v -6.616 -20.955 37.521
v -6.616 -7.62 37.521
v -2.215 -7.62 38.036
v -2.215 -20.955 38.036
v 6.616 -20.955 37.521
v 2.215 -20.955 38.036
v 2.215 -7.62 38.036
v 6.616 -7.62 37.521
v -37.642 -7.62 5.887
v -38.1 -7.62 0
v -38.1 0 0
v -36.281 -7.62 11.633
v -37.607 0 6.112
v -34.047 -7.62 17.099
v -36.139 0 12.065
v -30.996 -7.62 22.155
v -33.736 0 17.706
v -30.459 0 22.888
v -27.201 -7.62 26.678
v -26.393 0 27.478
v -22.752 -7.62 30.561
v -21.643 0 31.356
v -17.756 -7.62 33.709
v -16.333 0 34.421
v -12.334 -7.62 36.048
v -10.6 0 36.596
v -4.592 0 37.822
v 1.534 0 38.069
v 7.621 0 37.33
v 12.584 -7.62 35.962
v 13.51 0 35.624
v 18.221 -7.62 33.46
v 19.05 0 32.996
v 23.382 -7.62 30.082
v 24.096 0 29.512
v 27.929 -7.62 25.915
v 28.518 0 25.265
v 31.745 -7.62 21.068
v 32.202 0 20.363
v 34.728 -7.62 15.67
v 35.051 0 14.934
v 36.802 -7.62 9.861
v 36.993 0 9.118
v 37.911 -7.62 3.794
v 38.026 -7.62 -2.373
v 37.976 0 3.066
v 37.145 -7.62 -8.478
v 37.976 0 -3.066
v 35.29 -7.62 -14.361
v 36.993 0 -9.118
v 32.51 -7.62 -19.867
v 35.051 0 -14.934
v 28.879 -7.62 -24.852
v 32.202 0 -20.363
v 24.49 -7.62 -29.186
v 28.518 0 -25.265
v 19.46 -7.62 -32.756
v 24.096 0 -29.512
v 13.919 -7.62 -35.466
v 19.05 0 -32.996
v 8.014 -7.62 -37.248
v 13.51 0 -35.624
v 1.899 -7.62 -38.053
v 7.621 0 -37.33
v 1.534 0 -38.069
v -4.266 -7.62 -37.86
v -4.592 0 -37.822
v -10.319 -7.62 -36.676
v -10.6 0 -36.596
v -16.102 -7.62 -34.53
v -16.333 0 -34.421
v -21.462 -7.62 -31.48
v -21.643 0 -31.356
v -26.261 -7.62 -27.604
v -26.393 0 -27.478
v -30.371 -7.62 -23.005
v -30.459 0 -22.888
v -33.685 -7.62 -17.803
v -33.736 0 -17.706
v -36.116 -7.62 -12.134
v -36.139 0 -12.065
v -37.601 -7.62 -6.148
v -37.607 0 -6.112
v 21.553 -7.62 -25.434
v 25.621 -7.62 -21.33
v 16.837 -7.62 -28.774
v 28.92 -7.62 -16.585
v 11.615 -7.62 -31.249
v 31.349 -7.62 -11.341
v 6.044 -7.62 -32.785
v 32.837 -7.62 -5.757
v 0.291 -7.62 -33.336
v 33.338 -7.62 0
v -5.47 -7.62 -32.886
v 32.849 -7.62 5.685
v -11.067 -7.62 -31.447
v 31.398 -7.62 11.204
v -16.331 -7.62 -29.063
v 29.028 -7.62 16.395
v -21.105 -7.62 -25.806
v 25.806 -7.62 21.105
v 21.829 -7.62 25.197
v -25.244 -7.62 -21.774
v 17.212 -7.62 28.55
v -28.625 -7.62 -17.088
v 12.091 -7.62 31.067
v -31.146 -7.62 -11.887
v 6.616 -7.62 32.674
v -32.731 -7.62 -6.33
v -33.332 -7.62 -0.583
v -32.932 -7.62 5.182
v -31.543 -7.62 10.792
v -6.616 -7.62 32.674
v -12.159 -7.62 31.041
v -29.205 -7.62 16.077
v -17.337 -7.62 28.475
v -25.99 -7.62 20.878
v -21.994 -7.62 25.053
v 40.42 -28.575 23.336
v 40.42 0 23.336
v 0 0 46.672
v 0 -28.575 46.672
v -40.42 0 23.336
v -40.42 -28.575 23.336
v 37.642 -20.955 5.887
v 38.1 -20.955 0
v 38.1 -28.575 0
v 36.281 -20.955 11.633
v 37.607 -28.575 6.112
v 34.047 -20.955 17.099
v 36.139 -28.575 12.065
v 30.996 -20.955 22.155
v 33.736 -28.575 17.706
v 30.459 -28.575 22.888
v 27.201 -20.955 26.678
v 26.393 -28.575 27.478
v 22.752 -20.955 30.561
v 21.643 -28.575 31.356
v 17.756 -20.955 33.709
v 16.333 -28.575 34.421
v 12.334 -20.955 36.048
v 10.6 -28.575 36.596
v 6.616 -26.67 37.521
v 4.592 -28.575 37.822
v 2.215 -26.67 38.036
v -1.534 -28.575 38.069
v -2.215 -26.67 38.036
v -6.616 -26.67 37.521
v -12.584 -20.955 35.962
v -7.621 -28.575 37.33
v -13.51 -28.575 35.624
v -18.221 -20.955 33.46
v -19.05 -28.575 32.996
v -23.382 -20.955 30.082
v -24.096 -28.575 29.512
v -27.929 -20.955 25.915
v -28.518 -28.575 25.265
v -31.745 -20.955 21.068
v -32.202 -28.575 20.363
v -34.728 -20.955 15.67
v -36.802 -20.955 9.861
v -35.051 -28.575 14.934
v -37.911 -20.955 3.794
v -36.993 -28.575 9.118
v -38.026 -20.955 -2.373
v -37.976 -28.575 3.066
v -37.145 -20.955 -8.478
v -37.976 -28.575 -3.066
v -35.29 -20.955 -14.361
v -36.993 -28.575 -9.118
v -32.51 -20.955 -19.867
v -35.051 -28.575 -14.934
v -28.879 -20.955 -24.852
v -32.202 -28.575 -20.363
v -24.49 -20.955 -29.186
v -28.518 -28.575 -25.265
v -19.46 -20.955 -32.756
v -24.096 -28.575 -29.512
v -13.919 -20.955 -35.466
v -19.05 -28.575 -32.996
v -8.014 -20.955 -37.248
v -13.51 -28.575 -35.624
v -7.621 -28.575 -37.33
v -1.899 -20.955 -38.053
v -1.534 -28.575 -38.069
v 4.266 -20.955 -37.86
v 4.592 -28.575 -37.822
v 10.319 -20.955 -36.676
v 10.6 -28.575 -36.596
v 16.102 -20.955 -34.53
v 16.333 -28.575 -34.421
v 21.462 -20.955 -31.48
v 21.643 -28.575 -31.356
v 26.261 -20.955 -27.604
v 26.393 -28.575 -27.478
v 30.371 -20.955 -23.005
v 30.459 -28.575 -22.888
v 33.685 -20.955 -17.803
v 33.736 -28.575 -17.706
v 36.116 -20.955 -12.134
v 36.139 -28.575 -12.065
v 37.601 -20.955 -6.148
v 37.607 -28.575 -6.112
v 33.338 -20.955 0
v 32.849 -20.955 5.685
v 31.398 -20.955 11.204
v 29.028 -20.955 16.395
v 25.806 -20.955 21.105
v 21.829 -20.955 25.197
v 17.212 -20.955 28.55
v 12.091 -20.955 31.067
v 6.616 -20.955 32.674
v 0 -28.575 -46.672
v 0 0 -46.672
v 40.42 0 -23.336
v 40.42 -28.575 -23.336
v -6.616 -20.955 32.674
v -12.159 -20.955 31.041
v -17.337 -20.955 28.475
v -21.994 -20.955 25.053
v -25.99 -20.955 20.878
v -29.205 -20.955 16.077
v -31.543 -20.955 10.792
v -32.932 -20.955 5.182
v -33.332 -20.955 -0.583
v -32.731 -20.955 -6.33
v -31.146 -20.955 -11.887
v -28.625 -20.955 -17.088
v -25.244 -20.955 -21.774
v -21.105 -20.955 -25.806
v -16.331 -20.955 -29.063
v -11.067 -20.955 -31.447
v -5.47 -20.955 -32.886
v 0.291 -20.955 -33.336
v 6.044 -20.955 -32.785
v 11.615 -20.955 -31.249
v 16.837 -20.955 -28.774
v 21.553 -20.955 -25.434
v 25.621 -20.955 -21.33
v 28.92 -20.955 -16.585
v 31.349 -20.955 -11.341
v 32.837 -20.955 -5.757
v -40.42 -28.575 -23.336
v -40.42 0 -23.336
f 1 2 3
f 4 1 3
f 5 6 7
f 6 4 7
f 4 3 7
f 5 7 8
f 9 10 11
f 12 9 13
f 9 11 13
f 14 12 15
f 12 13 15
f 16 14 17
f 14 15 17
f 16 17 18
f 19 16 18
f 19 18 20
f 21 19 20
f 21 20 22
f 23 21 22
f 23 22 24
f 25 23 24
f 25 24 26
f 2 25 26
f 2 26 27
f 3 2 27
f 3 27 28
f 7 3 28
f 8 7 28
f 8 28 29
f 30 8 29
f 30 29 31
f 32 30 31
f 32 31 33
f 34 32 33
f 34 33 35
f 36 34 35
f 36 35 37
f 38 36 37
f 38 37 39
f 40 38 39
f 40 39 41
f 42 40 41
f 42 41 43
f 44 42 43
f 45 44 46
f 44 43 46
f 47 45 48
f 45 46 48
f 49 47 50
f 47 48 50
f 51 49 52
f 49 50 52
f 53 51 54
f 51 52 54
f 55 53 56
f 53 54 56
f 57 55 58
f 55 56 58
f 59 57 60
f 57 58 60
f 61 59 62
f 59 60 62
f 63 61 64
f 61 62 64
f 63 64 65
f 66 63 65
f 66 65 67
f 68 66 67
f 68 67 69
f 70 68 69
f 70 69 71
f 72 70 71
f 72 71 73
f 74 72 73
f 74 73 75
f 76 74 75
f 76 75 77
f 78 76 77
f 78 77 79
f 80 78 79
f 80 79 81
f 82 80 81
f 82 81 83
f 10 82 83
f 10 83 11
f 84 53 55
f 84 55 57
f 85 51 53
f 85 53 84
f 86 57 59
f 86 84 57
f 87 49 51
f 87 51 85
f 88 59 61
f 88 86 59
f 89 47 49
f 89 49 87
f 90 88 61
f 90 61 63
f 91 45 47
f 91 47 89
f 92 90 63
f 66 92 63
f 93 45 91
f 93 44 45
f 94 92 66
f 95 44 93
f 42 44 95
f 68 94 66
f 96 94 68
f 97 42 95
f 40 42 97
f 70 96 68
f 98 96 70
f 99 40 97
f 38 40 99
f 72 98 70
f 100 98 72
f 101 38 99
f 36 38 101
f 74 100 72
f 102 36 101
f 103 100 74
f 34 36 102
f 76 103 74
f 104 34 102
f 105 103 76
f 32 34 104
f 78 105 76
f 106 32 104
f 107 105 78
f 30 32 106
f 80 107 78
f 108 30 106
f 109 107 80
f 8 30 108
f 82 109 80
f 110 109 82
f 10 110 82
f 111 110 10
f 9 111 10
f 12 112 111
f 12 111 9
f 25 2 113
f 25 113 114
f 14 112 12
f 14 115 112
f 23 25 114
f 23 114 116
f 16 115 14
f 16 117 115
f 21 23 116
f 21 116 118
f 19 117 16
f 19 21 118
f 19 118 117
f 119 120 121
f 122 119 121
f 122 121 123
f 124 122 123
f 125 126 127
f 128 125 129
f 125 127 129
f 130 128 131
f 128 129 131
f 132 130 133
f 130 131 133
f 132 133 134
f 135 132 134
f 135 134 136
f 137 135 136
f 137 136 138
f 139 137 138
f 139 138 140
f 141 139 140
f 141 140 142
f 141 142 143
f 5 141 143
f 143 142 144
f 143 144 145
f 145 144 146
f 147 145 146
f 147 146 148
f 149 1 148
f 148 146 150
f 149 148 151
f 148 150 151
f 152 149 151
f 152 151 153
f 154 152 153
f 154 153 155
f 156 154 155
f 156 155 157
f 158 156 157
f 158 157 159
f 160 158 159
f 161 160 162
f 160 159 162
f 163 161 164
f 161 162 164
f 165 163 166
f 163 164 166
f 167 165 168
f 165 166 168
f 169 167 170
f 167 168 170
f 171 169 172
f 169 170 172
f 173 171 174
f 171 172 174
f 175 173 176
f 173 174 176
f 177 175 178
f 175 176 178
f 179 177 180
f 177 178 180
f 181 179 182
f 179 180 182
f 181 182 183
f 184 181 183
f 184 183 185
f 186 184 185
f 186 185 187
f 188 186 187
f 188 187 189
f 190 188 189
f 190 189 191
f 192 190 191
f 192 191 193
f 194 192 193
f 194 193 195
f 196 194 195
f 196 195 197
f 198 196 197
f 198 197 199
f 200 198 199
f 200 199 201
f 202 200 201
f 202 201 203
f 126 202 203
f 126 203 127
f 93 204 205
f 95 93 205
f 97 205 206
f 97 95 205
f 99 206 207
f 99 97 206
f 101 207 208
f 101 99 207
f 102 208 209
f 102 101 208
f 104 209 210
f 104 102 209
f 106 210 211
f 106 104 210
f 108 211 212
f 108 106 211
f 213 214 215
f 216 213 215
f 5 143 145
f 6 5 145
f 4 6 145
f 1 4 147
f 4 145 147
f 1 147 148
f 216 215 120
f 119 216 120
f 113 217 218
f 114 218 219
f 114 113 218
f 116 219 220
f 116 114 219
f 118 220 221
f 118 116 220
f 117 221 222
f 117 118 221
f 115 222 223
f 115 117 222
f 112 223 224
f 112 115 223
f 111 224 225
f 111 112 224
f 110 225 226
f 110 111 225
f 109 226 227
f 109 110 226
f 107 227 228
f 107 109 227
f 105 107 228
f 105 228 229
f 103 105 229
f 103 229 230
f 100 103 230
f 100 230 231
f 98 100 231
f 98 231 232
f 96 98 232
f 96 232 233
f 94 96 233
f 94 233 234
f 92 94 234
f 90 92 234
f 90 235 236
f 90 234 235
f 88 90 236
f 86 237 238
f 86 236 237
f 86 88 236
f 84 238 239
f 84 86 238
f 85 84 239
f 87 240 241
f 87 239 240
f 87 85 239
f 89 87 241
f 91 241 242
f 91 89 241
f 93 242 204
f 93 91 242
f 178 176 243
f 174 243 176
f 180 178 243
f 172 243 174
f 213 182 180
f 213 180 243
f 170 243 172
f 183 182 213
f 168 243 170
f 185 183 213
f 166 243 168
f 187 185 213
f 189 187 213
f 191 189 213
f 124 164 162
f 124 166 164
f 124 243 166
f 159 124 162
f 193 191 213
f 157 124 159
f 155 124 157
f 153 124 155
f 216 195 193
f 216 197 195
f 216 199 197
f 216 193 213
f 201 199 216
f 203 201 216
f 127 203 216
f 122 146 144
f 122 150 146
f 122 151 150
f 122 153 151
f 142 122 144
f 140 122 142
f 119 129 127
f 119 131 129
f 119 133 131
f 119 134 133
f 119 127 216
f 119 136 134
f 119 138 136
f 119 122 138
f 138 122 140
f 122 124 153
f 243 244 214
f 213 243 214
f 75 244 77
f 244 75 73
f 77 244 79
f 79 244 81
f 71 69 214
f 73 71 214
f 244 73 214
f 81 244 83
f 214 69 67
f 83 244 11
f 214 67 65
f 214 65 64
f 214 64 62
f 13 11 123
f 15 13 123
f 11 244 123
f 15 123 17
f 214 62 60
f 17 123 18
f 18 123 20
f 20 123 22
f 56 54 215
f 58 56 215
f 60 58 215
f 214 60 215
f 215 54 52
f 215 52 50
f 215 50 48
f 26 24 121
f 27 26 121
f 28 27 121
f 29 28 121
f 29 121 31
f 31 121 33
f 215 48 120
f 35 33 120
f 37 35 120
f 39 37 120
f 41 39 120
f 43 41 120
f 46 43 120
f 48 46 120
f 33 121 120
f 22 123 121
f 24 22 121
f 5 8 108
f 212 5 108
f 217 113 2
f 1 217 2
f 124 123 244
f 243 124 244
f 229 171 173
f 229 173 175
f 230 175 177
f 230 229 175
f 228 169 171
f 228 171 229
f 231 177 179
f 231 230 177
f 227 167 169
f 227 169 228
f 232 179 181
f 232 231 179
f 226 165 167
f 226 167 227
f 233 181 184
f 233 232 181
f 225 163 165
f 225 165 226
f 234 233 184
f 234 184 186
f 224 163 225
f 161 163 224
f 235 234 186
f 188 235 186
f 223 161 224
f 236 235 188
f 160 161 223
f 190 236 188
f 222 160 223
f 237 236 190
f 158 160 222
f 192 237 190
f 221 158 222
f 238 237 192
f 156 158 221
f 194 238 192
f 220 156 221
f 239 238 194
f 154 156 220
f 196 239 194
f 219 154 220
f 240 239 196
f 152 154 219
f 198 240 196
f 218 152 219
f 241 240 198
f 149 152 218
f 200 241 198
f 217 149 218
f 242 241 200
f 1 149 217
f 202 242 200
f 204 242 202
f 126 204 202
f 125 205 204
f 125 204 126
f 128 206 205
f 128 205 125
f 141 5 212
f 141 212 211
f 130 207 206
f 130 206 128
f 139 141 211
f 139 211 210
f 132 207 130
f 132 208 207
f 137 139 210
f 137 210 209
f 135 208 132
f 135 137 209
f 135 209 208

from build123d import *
from build123d import SkipClean  # not in build123d's __all__

# Parameters (mm, degrees)
F0_R     = 44.45
F1_DEPTH = 38.1
F2_R     = 50.8
F3_DEPTH = 10.16
F4_R     = 50.8
F5_DEPTH = 10.16
F7_DEPTH = 25.4
F8_SCALE = 0.75


with BuildPart() as f1:
    # F0 (on Front) → F1 (new body)
    with BuildSketch(Plane.XZ):
        Polygon((53.8927608775, 31.115), (0, 62.23), (-53.8927608775, 31.115), (-53.8927608775, -31.115), (0, -62.23), (53.8927608775, -31.115), align=None)
        Circle(F0_R, mode=Mode.SUBTRACT)
    extrude(amount=F1_DEPTH)

    # F2 (on face) → F3 (cut)
    with BuildSketch(Plane.XZ.offset(38.1)):
        Circle(F2_R)
    extrude(amount=-F3_DEPTH, mode=Mode.SUBTRACT)

    # F4 (on face) → F5 (cut)
    with BuildSketch(Plane(origin=(0, 0, 0), x_dir=(-1, 0, 0), z_dir=(0, 1, 0))):
        Circle(F4_R)
    extrude(amount=-F5_DEPTH, mode=Mode.SUBTRACT)

    # F6 (on face) → F7 (cut)
    with BuildSketch(Plane(origin=(0, -10.16, 0), x_dir=(-1, 0, 0), z_dir=(0, 1, 0))):
        with BuildLine():
            Line((7.7186614973, 43.7747046214), (8.8213274255, 50.028233853))
            ThreePointArc((8.8213274255, 50.028233853), (0, 50.8), (-8.8213274255, 50.028233853))
            Line((-8.8213274255, 50.028233853), (-7.7186614973, 43.7747046214))
            ThreePointArc((-7.7186614973, 43.7747046214), (0, 44.45), (7.7186614973, 43.7747046214))
        make_face()
        with BuildLine():
            Line((-7.7186614973, 43.7747046214), (-8.8213274255, 50.028233853))
            Line((-8.8213274255, 50.028233853), (-8.8213274255, 43.5658889781))
            ThreePointArc((-8.8213274255, 43.5658889781), (-8.2706535041, 43.6737769218), (-7.7186614973, 43.7747046214))
        make_face()
        with BuildLine():
            Line((8.8213274255, 43.5658889781), (8.8213274255, 50.028233853))
            Line((8.8213274255, 50.028233853), (7.7186614973, 43.7747046214))
            ThreePointArc((7.7186614973, 43.7747046214), (8.2706535041, 43.6737769218), (8.8213274255, 43.5658889781))
        make_face()
    with SkipClean():  # cleaning this boolean's faces spoils the solid; the shape is the same uncleaned
        extrude(amount=-F7_DEPTH, mode=Mode.SUBTRACT)


with BuildPart() as f1_1:
    # F8: moved
    add(f1.part.scale(F8_SCALE), clean=False)


solid = f1_1.part
